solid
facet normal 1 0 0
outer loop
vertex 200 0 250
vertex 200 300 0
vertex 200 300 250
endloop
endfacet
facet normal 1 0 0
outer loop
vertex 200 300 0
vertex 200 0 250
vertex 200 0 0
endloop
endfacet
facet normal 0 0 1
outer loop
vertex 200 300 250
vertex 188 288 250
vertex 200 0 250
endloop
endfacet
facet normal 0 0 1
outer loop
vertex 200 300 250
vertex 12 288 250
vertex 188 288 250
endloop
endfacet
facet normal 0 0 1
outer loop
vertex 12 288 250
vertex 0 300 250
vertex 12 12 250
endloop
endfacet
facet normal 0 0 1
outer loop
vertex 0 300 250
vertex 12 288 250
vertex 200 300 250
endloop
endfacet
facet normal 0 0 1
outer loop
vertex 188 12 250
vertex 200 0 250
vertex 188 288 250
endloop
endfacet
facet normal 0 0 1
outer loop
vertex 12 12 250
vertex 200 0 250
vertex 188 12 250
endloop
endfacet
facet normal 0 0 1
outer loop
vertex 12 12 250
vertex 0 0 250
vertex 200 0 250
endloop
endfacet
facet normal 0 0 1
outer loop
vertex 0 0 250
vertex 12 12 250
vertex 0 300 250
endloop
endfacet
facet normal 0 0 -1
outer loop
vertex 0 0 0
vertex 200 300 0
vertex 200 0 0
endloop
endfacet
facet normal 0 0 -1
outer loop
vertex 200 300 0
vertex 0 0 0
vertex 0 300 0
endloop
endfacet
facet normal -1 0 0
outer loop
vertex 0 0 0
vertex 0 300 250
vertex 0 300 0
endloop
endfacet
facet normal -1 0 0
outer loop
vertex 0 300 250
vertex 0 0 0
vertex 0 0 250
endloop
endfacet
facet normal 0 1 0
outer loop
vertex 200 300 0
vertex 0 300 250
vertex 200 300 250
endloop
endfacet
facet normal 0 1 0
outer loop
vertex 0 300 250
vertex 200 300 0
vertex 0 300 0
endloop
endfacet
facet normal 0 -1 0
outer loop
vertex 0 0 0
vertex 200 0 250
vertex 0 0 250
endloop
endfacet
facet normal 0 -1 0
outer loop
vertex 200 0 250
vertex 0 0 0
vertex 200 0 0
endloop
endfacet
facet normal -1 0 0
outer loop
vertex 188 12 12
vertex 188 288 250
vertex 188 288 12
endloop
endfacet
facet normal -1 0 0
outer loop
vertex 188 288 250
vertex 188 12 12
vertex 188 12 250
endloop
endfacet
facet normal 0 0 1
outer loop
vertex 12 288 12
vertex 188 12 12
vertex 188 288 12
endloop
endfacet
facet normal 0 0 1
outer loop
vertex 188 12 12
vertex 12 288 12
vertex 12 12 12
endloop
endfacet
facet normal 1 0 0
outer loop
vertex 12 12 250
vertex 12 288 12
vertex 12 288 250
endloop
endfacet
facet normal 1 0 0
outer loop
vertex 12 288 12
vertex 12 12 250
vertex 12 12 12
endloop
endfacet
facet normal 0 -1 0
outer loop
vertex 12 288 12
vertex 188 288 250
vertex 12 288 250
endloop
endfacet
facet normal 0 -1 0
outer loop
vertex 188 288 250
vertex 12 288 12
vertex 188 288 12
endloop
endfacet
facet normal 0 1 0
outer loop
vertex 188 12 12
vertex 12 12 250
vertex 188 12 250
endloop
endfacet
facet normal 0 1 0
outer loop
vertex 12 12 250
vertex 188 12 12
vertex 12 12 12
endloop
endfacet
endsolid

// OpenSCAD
// Hangszóródoboz — paraméteres terv (kiindulási sablon)
// Még nincs valós specifikáció (meghajtó méret, doboz típus, cél térfogat).
// A paramétereket az első konkrét méretezéskor kell feltölteni.

wall_thickness = 12;
box_width      = 200;
box_height     = 300;
box_depth      = 250;

module box_shell(w, h, d, wall) {
    difference() {
        cube([w, h, d], center = false);
        translate([wall, wall, wall])
            cube([w - 2 * wall, h - 2 * wall, d - wall], center = false);
    }
}

box_shell(box_width, box_height, box_depth, wall_thickness);
